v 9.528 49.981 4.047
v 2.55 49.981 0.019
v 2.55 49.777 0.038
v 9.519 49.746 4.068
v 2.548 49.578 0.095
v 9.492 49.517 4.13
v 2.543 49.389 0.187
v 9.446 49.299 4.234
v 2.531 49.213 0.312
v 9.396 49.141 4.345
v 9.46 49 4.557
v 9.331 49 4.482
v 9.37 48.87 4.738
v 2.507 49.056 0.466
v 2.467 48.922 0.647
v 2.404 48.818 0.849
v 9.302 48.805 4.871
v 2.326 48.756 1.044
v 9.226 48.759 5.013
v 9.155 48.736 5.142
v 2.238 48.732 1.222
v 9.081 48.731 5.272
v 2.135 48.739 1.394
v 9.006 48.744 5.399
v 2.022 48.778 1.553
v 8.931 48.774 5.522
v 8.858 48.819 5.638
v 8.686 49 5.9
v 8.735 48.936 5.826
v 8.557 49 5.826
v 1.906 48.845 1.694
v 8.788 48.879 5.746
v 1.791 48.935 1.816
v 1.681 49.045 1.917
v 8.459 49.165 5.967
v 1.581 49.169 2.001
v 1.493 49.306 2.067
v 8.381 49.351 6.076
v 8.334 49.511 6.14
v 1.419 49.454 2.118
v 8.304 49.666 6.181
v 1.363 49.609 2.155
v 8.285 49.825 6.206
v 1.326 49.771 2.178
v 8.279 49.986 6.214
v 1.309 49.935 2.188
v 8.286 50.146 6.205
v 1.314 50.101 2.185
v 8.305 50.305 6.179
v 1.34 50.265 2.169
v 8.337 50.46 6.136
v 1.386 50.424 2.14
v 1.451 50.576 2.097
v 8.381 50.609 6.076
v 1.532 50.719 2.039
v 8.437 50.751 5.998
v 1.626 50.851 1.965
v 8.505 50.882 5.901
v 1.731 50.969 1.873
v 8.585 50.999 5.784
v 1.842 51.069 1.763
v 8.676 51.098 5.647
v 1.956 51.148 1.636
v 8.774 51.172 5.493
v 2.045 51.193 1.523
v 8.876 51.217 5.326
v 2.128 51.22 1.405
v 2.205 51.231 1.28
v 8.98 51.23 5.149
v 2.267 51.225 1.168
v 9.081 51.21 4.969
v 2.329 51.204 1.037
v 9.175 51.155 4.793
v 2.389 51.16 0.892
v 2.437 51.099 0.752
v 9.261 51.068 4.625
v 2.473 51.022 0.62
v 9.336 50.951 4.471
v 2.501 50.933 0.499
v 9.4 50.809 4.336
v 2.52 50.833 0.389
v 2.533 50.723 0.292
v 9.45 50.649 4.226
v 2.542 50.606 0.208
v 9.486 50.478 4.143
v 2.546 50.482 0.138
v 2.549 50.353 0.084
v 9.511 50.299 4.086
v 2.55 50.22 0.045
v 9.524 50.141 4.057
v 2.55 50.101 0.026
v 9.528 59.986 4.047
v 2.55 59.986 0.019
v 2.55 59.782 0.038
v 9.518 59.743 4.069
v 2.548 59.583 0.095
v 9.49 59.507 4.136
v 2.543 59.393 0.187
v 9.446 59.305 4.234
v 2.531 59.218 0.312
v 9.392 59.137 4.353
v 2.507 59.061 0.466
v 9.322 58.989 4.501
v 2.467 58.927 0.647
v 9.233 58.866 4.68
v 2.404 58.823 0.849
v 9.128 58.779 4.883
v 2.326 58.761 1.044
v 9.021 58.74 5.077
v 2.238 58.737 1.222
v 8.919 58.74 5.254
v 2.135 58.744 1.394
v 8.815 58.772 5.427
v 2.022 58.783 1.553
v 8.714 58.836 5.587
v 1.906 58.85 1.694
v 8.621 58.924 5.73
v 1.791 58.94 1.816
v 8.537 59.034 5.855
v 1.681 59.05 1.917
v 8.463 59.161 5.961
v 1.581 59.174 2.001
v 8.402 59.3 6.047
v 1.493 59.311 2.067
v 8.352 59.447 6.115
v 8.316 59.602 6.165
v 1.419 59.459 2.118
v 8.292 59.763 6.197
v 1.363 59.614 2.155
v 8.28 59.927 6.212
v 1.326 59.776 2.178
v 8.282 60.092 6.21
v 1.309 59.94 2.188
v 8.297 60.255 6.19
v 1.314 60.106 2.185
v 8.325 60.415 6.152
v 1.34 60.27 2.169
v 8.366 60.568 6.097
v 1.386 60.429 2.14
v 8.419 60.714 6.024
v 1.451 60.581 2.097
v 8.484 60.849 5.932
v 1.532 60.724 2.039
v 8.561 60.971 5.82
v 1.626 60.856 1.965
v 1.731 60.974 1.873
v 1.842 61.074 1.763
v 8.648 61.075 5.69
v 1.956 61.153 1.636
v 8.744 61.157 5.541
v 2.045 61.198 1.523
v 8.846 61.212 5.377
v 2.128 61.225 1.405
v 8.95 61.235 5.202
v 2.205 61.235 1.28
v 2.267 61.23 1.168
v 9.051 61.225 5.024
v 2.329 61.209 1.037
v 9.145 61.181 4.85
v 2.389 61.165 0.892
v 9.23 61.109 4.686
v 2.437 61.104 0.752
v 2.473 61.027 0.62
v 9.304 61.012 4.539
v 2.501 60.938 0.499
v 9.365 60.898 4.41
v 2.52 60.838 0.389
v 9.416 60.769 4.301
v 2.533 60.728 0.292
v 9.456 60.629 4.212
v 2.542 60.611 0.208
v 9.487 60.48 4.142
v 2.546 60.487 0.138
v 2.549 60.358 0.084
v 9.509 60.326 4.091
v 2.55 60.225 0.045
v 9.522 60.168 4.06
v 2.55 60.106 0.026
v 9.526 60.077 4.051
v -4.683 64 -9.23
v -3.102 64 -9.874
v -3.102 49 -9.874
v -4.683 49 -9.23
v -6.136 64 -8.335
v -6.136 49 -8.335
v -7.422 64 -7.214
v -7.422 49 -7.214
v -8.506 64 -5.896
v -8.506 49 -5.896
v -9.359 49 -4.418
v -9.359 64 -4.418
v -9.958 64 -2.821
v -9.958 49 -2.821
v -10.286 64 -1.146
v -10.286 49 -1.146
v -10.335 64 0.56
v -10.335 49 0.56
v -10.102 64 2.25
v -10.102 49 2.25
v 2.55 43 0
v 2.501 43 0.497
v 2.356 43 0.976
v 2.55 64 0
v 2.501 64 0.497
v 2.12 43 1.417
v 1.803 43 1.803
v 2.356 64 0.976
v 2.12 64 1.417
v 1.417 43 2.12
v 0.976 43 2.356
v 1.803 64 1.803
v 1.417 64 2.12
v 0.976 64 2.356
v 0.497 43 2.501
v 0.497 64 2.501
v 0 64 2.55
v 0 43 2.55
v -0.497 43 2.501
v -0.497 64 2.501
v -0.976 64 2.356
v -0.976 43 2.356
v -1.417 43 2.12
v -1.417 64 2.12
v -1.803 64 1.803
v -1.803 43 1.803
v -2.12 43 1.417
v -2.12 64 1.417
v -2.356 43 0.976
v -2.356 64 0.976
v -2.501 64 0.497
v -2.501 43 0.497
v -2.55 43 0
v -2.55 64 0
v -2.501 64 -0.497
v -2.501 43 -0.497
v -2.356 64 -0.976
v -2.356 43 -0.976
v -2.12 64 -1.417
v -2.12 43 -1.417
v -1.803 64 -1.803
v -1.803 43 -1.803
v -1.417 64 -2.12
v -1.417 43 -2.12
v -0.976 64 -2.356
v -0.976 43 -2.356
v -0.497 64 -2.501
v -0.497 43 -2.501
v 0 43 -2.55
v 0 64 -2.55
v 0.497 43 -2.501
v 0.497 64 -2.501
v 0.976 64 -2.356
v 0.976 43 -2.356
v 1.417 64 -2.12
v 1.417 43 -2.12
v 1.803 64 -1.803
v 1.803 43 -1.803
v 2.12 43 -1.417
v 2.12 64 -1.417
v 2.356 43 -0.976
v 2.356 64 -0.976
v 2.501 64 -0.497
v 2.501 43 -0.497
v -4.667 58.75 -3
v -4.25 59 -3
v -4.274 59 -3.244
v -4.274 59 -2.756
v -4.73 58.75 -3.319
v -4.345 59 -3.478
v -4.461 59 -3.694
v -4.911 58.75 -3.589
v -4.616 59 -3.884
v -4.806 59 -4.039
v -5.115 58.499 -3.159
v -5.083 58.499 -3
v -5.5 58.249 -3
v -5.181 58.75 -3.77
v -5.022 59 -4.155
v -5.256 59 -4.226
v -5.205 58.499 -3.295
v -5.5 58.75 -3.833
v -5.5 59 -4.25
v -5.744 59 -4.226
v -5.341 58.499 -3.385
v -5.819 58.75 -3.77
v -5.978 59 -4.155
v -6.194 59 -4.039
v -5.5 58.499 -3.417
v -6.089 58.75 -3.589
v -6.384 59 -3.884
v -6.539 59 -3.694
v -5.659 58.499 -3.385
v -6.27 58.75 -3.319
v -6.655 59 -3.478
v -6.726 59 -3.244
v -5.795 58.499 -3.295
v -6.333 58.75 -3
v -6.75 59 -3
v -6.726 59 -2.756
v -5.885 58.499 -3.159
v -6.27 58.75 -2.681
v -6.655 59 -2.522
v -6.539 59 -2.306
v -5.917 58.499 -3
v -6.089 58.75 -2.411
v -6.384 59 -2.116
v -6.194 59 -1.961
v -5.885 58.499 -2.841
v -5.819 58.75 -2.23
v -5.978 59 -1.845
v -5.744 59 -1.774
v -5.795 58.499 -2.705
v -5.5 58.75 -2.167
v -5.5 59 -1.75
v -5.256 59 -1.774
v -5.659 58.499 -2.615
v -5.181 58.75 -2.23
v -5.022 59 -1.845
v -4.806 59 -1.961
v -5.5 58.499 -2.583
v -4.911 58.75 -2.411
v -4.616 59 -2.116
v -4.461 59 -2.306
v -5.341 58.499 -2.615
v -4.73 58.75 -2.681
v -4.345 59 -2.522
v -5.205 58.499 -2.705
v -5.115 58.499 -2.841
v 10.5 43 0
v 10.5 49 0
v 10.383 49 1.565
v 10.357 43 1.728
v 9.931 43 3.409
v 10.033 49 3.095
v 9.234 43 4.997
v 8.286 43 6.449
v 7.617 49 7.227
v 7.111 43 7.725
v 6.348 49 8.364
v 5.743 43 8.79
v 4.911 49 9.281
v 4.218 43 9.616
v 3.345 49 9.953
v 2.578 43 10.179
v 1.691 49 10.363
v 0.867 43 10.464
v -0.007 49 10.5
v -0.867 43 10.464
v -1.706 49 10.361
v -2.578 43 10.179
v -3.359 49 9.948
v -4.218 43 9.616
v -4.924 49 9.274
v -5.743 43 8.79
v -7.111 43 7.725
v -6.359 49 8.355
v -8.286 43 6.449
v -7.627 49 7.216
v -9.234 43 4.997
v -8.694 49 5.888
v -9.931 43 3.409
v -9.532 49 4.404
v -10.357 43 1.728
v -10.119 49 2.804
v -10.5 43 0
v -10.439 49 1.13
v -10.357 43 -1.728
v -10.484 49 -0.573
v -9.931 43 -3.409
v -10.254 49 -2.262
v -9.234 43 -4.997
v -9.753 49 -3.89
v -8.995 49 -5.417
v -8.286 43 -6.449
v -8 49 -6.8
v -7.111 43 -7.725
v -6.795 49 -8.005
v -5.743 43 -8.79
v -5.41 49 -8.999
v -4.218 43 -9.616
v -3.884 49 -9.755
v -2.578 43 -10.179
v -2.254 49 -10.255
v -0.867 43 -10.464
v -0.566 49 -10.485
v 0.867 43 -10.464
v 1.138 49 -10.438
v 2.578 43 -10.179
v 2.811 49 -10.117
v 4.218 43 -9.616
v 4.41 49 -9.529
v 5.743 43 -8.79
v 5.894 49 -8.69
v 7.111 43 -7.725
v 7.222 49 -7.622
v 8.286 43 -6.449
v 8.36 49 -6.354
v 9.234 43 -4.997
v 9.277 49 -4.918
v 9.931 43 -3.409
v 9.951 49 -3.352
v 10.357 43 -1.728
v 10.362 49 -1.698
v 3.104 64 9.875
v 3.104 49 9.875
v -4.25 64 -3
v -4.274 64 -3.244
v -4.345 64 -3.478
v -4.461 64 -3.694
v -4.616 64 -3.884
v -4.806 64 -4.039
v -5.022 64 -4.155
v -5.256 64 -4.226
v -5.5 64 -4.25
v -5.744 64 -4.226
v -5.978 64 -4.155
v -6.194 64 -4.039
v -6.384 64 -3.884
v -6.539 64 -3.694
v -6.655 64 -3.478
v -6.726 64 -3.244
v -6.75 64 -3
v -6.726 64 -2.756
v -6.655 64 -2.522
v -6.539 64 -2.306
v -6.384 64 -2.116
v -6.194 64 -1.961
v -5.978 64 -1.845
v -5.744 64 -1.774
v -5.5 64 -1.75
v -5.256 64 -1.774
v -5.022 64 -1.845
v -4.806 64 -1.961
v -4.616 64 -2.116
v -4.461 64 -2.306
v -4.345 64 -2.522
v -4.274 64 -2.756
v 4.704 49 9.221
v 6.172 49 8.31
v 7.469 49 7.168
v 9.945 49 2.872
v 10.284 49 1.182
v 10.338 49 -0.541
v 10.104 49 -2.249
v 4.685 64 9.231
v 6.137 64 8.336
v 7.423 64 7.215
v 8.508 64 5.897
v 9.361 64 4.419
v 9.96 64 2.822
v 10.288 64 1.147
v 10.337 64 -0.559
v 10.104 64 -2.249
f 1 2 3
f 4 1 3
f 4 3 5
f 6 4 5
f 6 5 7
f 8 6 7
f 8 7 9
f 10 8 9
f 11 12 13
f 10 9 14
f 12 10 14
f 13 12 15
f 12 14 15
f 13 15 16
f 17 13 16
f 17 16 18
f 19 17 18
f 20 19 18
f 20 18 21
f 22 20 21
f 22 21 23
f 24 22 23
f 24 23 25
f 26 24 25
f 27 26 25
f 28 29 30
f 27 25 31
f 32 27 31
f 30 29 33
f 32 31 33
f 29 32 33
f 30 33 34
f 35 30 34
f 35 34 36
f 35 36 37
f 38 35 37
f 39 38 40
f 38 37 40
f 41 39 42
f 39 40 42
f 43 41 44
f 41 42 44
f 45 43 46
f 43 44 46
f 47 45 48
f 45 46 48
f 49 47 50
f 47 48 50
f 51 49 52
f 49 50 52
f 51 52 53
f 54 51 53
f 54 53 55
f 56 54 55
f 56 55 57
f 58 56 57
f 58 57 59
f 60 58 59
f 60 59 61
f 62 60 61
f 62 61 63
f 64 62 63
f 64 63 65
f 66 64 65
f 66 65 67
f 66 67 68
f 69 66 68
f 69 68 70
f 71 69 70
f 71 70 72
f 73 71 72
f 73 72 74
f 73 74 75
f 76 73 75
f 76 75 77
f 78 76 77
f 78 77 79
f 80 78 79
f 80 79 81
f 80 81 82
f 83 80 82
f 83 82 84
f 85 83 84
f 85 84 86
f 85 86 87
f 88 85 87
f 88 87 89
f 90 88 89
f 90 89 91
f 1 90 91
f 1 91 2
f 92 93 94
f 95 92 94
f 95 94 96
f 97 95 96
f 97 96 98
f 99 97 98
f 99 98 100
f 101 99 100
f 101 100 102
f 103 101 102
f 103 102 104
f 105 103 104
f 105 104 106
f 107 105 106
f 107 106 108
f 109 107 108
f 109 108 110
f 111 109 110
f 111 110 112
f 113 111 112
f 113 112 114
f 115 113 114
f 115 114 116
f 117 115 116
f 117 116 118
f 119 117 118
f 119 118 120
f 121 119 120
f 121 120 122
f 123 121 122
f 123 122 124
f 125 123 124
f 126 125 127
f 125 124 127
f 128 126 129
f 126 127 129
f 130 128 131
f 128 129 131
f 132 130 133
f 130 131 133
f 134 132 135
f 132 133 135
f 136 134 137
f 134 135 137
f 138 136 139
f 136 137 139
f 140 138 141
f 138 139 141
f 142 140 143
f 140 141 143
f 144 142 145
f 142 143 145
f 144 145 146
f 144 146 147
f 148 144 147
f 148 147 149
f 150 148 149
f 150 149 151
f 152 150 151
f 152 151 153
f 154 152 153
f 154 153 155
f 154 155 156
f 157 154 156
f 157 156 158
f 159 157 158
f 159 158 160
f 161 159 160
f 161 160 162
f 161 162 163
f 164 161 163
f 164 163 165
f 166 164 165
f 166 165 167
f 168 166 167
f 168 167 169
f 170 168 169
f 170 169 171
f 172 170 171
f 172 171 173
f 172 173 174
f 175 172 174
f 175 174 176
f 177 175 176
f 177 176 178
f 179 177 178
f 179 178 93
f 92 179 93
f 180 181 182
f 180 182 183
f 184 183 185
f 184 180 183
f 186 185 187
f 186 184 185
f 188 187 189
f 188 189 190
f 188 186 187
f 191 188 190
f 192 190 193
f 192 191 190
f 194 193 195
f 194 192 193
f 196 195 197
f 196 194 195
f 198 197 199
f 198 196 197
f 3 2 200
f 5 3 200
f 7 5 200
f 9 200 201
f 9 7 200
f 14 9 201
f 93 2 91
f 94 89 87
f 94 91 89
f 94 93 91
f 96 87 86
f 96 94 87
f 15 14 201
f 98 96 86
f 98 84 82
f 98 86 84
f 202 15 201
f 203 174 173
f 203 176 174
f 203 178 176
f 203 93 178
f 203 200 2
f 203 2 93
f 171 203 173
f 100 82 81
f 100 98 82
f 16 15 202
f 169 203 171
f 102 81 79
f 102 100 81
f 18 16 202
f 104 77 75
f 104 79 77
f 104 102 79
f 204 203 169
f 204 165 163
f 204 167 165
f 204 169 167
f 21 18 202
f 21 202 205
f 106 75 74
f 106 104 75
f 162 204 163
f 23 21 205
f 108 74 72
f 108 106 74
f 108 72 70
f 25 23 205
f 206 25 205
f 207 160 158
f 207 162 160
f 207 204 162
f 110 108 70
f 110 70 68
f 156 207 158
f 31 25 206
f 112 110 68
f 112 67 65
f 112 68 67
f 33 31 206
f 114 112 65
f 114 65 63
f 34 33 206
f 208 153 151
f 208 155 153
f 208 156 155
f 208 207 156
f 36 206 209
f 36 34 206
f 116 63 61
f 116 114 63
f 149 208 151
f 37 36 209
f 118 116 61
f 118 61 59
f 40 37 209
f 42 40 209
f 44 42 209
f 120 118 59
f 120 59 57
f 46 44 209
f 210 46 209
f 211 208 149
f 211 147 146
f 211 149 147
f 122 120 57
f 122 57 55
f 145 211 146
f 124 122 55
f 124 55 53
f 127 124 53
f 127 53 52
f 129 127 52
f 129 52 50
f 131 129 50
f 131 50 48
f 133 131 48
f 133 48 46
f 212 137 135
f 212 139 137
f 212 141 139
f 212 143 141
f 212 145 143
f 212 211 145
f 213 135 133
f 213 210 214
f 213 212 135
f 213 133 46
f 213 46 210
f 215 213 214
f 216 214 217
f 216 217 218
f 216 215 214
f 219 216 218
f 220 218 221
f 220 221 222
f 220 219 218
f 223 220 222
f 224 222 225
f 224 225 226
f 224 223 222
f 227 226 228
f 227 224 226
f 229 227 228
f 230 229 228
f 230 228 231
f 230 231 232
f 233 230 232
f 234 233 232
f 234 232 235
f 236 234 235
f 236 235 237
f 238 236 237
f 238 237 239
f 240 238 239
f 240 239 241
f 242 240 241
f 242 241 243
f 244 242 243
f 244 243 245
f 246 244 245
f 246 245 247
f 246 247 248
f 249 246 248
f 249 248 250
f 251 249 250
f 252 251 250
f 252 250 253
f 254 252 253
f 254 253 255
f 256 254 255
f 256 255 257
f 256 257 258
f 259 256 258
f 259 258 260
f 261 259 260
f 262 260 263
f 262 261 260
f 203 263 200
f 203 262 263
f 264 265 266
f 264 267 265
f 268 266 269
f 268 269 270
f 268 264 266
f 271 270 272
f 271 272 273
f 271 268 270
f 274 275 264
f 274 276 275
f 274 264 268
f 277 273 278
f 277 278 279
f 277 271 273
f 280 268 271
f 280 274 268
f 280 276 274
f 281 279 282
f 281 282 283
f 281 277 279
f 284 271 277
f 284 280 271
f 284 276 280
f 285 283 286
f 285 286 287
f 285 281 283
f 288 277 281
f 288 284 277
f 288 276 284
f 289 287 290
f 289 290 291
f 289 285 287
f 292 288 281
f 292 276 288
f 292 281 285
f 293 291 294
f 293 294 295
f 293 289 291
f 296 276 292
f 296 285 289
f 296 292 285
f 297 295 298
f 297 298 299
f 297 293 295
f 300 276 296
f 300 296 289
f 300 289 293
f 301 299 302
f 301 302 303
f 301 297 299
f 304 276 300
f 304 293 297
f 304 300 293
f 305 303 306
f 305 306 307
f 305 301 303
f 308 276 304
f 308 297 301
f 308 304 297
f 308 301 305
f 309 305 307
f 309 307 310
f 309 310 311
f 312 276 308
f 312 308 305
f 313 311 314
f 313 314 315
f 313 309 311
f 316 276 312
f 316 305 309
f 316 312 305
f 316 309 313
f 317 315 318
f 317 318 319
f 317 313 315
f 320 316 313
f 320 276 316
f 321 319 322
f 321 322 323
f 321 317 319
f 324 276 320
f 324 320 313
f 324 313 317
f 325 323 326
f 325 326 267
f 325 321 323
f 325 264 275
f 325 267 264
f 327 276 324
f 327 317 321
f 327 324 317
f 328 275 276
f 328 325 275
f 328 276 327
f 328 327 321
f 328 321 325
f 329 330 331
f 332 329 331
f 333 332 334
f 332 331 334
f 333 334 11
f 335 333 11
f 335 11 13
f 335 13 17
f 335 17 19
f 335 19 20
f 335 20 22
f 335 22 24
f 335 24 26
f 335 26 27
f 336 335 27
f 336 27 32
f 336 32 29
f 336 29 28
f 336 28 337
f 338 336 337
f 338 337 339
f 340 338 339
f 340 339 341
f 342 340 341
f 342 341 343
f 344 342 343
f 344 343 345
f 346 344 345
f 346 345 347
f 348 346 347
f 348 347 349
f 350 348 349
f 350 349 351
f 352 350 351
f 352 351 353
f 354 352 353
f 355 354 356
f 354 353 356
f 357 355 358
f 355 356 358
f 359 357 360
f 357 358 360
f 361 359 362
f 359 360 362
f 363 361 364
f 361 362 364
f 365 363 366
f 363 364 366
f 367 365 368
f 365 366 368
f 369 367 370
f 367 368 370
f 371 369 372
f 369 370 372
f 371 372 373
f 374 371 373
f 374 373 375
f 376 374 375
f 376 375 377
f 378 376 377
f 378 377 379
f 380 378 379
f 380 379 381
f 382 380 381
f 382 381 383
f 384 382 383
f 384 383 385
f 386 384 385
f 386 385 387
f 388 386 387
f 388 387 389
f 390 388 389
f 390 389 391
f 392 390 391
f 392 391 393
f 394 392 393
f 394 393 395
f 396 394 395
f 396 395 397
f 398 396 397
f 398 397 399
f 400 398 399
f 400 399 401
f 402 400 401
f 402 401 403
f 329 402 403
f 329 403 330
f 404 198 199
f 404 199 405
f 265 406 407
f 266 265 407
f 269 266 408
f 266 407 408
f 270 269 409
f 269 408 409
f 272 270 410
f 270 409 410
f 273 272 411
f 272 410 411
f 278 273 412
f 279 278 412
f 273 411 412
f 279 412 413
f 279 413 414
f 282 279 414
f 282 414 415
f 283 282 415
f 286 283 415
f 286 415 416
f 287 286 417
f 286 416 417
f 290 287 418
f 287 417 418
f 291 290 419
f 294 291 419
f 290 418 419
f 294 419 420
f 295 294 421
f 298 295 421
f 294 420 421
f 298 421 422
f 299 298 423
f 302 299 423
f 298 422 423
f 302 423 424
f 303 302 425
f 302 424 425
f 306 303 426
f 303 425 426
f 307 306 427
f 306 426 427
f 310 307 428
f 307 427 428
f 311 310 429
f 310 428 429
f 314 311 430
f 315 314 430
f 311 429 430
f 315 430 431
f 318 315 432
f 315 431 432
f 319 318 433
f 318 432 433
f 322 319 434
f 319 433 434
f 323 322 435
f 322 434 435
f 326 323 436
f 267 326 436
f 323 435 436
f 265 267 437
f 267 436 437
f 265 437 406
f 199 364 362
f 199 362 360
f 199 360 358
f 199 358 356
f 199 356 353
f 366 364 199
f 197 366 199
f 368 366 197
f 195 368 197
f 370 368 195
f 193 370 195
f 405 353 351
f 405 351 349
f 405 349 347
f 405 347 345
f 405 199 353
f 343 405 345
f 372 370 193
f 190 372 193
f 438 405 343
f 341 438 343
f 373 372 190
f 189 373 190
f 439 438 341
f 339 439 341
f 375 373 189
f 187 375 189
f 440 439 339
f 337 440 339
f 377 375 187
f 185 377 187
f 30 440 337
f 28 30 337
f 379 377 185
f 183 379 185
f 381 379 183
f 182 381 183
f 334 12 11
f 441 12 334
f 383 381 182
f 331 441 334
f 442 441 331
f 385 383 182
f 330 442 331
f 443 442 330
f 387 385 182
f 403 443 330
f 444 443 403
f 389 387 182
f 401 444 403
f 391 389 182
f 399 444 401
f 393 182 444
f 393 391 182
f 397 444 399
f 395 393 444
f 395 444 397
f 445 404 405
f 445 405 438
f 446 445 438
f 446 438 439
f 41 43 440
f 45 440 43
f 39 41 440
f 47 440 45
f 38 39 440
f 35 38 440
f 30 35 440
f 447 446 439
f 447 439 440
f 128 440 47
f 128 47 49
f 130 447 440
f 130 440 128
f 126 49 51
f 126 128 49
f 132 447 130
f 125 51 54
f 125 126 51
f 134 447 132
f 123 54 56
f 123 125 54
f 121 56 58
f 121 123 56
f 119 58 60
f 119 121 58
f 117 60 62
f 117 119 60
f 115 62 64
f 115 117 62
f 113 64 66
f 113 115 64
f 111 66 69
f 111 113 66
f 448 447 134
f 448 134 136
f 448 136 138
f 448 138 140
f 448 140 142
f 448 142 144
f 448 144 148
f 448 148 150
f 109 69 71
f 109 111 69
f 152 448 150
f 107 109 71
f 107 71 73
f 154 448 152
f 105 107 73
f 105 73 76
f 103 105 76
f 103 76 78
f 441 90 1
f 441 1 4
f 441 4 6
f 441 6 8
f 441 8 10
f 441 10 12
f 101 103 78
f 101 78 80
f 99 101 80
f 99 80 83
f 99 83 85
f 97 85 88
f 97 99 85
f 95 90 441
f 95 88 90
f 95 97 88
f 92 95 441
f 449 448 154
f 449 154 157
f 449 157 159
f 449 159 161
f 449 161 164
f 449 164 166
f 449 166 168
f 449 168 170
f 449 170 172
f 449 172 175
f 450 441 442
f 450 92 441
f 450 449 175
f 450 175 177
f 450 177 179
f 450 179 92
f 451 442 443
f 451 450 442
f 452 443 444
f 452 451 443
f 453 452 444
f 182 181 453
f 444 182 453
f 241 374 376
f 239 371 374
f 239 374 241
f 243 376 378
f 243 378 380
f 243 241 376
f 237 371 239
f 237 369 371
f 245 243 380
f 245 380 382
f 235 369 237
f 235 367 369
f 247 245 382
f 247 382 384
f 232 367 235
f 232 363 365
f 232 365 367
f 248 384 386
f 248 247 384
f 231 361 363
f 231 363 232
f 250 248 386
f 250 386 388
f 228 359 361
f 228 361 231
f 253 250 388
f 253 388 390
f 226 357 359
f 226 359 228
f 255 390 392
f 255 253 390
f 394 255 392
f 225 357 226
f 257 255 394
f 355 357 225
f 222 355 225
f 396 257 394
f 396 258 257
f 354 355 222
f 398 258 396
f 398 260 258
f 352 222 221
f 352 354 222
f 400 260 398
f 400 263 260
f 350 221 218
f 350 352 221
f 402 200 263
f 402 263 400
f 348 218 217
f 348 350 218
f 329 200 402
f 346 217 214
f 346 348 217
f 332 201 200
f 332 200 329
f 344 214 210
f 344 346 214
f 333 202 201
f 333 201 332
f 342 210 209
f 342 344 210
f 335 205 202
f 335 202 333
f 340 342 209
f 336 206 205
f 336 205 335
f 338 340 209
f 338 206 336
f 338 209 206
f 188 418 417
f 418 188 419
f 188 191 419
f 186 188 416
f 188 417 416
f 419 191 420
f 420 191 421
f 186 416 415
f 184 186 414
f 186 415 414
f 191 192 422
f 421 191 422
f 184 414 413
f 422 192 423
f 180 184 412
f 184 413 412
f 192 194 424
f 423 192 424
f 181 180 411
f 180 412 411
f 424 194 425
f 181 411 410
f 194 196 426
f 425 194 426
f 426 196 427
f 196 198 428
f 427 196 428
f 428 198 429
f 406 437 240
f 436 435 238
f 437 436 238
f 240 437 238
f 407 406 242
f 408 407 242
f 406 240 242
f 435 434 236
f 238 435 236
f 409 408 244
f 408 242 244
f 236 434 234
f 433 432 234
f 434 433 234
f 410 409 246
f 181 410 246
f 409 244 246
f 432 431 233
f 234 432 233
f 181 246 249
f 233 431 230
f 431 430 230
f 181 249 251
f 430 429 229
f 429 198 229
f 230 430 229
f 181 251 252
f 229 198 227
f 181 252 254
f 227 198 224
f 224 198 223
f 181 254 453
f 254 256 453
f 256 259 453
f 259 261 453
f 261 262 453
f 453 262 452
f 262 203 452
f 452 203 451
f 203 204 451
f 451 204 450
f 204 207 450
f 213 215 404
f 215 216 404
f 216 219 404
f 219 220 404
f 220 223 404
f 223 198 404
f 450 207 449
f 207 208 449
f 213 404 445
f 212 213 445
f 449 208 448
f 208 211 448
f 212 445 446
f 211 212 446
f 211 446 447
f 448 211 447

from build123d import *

# Parameters (mm, degrees)
SKETCH001_R    = 10.5
SKETCH001_R_2  = 2.55
PAD001_DEPTH   = 21
SKETCH003_R    = 20.618255
POCKET_DEPTH   = 15
SKETCH015_R    = 1.25
HOLE004_DEPTH  = 5
HOLE004_TIPS_R = 1.25
SKETCH039_R    = 1.25
HOLE011_DEPTH  = 10
HOLE011_TIPS_R = 1.25


with BuildPart() as part:
    # Sketch001 → Pad001 (new body)
    with BuildSketch(Plane.XZ):
        Circle(SKETCH001_R)
        Circle(SKETCH001_R_2, mode=Mode.SUBTRACT)
    extrude(amount=PAD001_DEPTH)

    # Sketch003 (on Face3 of Pad001) → Pocket (cut)
    with BuildSketch(Plane(origin=(0, 0, 0), x_dir=(1, 0, 0), z_dir=(0, 1, 0))):
        Circle(SKETCH003_R)
        with BuildLine():
            ThreePointArc((-3.1024143311, 9.8740835179), (-8.9633629292, 5.175), (-10.1024143311, -2.2502721351))
            Line((-10.1024143311, -2.2502721351), (3.1044730766, -9.8752721351))
            ThreePointArc((3.1044730766, -9.8752721351), (8.9648795095, -5.175875598), (10.1044730766, 2.2490835179))
            Line((-3.1024143311, 9.8740835179), (10.1044730766, 2.2490835179))
        make_face(mode=Mode.SUBTRACT)
    extrude(amount=-POCKET_DEPTH, mode=Mode.SUBTRACT)

    # Sketch015 (on Face9 of Pocket) → Hole004 (cut)
    with BuildSketch(Plane(origin=(0, 0, 0), x_dir=(1, 0, 0), z_dir=(0, 1, 0))):
        with Locations((-5.5, 3)):
            Circle(SKETCH015_R)
    extrude(amount=-HOLE004_DEPTH, mode=Mode.SUBTRACT)

    # Hole004 tips → Hole004 tip 1 section 0
    with BuildSketch(Plane(origin=(0, -5, 0), x_dir=(1, 0, 0), z_dir=(0, 1, 0)), mode=Mode.PRIVATE) as hole004_tip_1_s0:
        with Locations((-5.5, 3)):
            Circle(HOLE004_TIPS_R)
    loft([hole004_tip_1_s0.sketch, Vertex(-5.5, -5.7510757738, -3)], mode=Mode.SUBTRACT)

    # Sketch039 (on DatumPlane) → Hole011 (cut)
    with BuildSketch(Plane(origin=(2, 0, 0), x_dir=(0.5, 0, -0.8660254038), z_dir=(-0.8660254038, 0, -0.5))):
        with Locations((-0.991399, 14.019394)):
            Circle(SKETCH039_R)
        with Locations((-0.991399, 4.014446)):
            Circle(SKETCH039_R)
    extrude(amount=-HOLE011_DEPTH, mode=Mode.SUBTRACT)

    # Hole011 tips → Hole011 tip 1 section 0
    with BuildSketch(Plane(origin=(10.6602540378, 0, 5), x_dir=(0.5, 0, -0.8660254038), z_dir=(-0.8660254038, 0, -0.5)), mode=Mode.PRIVATE) as hole011_tip_1_s0:
        with Locations((-0.991399, 14.019394)):
            Circle(HOLE011_TIPS_R)
    loft([hole011_tip_1_s0.sketch, Vertex(10.8150052381, -14.019394, 6.2341146062)], mode=Mode.SUBTRACT)

    # Hole011 tips → Hole011 tip 2 section 0
    with BuildSketch(Plane(origin=(10.6602540378, 0, 5), x_dir=(0.5, 0, -0.8660254038), z_dir=(-0.8660254038, 0, -0.5)), mode=Mode.PRIVATE) as hole011_tip_2_s0:
        with Locations((-0.991399, 4.014446)):
            Circle(HOLE011_TIPS_R)
    loft([hole011_tip_2_s0.sketch, Vertex(10.8150052381, -4.014446, 6.2341146062)], mode=Mode.SUBTRACT)


with BuildPart() as part_1:
    # Body001 placement: moved
    add(part.part.moved(Location((0, 64, 0))))


solid = part_1.part
